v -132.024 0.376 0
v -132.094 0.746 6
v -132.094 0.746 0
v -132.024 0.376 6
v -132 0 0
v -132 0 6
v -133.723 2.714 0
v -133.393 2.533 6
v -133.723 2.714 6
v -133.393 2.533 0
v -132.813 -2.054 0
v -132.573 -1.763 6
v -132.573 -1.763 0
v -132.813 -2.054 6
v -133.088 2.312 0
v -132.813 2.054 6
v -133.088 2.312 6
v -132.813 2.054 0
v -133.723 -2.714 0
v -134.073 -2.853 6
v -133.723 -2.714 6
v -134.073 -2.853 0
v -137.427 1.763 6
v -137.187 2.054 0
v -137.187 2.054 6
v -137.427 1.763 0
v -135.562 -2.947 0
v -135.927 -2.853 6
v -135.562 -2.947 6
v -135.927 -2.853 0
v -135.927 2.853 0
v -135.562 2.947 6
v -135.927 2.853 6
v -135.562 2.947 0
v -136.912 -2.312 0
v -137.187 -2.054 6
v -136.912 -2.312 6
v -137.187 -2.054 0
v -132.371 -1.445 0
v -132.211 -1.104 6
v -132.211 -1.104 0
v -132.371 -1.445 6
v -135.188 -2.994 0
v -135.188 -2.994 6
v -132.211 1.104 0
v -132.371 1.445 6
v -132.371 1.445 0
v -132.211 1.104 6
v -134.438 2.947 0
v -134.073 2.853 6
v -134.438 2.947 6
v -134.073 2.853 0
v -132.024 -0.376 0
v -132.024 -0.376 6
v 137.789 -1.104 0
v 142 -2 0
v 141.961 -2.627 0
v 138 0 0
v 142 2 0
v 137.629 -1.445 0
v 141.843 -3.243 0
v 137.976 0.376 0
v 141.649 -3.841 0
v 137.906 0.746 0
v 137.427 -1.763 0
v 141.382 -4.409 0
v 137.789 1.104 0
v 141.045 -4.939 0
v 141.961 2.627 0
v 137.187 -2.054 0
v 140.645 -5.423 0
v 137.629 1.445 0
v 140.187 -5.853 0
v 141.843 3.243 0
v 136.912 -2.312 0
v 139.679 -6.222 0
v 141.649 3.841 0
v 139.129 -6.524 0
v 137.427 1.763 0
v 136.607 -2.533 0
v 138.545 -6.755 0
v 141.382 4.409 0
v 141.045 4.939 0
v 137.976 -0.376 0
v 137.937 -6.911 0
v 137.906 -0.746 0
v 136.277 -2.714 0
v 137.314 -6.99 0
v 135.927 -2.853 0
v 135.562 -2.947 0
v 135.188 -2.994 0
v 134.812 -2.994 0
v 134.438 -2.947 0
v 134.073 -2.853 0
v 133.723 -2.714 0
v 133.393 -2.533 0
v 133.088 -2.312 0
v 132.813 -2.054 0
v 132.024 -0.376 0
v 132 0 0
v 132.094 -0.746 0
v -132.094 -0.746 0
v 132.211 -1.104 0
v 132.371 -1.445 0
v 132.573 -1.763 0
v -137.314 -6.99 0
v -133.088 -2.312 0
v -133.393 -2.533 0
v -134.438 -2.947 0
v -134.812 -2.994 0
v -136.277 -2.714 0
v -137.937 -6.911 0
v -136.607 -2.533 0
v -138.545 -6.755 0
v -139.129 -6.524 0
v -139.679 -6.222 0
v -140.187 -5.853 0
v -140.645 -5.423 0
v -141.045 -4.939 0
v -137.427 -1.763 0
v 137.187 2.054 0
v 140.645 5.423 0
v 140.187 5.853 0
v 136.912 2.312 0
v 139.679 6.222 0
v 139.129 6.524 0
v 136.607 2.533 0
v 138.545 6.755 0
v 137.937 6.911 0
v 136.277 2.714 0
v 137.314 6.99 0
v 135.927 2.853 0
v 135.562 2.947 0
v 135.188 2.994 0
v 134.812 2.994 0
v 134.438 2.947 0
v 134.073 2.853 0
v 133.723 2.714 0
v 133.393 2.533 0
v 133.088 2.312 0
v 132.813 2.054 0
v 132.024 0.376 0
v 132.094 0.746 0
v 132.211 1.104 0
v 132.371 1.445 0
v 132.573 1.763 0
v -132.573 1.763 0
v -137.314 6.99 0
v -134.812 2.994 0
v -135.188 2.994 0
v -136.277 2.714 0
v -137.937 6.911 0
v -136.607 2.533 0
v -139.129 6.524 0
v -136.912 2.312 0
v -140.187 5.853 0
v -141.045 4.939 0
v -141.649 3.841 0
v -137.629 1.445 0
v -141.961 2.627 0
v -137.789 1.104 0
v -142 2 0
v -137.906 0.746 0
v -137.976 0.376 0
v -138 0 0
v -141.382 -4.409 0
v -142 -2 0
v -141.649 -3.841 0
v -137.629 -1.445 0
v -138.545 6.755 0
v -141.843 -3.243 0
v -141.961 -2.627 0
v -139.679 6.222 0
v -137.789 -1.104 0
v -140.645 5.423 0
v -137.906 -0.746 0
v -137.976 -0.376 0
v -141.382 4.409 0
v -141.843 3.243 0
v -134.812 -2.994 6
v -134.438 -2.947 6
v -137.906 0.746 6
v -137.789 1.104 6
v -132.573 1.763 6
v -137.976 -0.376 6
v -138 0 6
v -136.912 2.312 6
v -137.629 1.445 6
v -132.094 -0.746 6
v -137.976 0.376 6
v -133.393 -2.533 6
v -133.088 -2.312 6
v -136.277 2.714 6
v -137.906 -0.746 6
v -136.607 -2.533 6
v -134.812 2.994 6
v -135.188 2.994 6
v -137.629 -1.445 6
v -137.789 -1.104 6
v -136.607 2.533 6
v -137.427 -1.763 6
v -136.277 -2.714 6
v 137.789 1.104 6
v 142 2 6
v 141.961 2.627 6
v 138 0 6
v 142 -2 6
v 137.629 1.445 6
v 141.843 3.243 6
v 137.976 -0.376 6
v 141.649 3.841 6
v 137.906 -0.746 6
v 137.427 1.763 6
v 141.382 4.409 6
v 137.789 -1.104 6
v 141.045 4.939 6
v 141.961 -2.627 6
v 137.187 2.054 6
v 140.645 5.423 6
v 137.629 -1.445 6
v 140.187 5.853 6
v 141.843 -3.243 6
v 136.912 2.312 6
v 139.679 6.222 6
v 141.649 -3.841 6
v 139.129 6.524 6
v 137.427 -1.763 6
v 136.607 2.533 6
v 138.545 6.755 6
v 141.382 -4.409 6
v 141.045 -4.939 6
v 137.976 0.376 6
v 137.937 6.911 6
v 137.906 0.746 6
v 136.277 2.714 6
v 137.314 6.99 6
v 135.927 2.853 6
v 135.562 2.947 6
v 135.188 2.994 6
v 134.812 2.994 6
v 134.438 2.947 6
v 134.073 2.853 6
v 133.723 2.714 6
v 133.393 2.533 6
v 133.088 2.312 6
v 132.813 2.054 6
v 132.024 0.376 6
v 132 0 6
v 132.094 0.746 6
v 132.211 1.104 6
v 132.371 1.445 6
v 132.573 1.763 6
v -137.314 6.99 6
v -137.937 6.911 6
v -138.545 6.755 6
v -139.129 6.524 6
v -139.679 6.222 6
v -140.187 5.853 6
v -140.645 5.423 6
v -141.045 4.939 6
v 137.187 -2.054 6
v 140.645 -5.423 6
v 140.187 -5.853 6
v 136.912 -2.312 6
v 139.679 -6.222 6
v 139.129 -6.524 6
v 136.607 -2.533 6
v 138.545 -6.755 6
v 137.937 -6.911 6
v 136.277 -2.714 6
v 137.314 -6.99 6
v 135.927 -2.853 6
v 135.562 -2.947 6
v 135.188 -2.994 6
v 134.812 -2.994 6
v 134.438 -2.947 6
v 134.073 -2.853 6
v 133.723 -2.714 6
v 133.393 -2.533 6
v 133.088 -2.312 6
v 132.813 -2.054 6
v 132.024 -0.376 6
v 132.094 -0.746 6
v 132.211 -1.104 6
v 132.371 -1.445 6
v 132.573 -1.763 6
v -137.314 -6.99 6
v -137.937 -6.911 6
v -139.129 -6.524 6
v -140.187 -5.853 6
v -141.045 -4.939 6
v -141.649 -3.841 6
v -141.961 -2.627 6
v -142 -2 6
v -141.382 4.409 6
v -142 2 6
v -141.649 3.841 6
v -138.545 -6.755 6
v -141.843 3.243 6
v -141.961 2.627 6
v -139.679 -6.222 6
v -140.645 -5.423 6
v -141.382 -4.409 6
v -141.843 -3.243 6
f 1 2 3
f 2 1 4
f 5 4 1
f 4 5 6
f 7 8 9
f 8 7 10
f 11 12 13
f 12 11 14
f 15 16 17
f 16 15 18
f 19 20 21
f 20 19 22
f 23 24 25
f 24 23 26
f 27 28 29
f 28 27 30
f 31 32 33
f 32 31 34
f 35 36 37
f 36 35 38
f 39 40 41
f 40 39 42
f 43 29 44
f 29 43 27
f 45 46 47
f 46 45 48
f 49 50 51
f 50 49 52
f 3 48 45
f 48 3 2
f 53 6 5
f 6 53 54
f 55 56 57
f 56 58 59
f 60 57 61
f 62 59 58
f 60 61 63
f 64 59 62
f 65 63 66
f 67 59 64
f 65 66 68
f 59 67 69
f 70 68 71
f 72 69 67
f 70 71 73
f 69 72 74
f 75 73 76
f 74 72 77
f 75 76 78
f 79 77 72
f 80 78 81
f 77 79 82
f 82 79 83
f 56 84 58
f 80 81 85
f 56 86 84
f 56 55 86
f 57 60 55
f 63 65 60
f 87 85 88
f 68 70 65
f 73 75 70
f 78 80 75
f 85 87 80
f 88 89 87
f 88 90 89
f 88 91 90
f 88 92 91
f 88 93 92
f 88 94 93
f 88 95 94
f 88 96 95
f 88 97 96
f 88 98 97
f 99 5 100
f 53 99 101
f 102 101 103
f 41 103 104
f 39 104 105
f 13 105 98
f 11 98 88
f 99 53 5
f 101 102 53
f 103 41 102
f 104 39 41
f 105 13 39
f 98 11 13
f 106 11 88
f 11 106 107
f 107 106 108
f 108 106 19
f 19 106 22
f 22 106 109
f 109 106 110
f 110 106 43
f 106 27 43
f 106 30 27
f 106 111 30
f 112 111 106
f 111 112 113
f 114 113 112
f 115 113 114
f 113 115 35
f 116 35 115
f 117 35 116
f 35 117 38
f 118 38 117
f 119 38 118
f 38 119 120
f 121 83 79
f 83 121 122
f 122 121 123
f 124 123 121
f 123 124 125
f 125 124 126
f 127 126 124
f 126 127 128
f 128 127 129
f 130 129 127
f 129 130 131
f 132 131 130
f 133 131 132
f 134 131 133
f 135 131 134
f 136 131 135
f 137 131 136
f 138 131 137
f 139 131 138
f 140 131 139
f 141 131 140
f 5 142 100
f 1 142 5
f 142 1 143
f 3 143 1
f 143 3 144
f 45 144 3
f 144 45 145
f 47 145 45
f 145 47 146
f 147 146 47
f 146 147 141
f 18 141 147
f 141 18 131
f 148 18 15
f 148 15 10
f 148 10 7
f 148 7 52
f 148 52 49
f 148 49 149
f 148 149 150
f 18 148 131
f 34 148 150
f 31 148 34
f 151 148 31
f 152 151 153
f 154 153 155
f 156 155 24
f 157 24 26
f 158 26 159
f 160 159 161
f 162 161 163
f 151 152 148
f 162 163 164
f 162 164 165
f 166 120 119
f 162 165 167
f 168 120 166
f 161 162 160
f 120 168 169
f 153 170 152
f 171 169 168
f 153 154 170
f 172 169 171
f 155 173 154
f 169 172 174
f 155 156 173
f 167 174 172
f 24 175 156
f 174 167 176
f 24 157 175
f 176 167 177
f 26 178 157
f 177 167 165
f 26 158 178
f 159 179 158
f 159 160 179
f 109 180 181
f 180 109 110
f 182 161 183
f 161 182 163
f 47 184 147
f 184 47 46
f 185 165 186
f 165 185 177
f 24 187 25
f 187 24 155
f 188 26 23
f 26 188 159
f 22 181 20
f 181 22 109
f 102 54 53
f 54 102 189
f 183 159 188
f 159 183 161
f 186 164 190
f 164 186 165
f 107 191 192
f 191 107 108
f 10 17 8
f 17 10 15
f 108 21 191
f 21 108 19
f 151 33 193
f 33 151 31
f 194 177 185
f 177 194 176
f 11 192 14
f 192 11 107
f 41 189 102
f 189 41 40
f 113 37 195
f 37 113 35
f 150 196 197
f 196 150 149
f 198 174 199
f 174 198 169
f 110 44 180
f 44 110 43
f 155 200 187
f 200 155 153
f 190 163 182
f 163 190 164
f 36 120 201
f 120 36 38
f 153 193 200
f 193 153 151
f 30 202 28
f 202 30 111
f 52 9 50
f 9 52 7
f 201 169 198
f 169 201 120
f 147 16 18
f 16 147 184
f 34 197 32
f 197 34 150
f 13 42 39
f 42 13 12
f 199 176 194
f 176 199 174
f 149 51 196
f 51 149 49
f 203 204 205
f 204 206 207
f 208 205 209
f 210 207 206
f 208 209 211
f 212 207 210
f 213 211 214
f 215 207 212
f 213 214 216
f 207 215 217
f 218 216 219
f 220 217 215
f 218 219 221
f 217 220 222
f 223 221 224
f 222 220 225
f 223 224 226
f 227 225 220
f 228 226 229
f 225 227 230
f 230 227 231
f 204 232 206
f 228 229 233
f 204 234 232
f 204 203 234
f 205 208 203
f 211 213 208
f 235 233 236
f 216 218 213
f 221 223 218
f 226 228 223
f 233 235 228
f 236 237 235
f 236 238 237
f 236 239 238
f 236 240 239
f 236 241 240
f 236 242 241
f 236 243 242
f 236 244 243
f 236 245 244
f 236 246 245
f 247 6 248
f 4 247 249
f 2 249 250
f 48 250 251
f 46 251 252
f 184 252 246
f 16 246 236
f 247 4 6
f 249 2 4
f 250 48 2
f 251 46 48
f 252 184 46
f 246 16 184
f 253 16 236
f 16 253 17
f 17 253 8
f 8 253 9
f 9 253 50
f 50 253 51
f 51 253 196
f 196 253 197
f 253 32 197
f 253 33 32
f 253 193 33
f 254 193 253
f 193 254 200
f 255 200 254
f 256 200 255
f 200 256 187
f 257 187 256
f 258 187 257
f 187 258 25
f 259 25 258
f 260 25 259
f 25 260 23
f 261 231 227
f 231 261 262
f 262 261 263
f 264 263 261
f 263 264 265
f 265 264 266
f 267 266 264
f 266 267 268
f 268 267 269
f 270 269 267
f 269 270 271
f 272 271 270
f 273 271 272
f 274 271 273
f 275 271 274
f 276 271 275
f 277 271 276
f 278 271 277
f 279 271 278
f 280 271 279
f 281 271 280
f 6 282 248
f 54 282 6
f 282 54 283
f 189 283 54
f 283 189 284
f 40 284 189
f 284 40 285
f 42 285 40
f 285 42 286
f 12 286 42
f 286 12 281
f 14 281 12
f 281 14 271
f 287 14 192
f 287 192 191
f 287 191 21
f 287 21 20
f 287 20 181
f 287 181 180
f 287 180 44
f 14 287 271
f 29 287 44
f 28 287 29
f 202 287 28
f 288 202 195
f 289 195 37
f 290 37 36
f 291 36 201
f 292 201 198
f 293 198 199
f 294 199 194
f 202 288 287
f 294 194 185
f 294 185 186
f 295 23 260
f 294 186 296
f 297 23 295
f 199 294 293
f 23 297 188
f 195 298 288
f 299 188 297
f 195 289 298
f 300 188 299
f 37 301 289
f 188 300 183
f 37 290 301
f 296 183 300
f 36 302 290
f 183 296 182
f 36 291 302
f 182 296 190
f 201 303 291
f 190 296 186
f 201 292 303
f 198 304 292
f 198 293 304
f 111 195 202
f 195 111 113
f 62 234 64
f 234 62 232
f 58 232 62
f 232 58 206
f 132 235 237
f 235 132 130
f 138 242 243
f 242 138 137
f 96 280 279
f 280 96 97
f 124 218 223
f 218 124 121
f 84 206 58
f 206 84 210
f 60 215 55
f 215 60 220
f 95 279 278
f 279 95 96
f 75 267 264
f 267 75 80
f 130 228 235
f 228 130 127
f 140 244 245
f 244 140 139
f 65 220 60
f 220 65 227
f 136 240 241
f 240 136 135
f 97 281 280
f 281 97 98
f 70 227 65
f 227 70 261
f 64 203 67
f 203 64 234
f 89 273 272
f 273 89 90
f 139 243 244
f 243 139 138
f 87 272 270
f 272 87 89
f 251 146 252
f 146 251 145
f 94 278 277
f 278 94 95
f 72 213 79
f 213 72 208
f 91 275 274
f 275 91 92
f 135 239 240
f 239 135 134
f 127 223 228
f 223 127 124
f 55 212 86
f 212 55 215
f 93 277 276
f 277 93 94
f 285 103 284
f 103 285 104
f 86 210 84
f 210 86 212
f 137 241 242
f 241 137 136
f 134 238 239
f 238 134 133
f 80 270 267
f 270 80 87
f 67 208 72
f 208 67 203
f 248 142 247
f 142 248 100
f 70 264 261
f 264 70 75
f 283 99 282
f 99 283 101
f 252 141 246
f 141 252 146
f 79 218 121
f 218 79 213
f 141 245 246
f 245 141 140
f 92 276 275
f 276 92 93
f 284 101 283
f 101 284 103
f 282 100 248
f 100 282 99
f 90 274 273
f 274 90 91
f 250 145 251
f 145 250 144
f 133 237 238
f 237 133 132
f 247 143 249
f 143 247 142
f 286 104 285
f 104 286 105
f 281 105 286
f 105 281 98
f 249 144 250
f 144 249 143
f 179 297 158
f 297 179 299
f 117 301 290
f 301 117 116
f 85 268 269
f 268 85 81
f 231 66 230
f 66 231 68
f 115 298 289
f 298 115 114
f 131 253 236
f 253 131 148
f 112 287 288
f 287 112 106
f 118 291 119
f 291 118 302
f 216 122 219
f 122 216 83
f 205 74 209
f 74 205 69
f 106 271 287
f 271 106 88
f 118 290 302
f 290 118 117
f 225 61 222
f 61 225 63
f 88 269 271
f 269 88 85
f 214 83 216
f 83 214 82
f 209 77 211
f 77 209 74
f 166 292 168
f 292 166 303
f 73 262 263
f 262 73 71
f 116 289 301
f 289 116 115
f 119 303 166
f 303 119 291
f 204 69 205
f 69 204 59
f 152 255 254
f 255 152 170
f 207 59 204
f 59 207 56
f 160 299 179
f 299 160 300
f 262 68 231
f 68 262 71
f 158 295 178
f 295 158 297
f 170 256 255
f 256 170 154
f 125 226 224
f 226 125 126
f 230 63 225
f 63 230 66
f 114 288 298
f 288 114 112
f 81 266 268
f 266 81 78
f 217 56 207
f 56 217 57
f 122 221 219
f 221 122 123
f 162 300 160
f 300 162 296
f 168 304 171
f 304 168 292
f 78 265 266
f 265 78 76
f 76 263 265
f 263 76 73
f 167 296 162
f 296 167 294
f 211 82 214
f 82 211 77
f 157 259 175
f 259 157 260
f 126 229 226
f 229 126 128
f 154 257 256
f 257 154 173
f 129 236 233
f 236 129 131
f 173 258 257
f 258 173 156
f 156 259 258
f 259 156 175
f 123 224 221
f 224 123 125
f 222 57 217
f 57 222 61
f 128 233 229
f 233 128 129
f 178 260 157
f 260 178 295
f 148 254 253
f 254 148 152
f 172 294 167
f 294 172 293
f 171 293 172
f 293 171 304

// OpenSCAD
$fn = 50;


difference() {
	union() {
		hull() {
			translate(v = [-137.0000000000, 2.0000000000, 0]) {
				cylinder(h = 6, r = 5);
			}
			translate(v = [137.0000000000, 2.0000000000, 0]) {
				cylinder(h = 6, r = 5);
			}
			translate(v = [-137.0000000000, -2.0000000000, 0]) {
				cylinder(h = 6, r = 5);
			}
			translate(v = [137.0000000000, -2.0000000000, 0]) {
				cylinder(h = 6, r = 5);
			}
		}
	}
	union() {
		translate(v = [-135.0000000000, 0.0000000000, 0]) {
			cylinder(h = 6, r = 3.0000000000);
		}
		translate(v = [135.0000000000, 0.0000000000, 0]) {
			cylinder(h = 6, r = 3.0000000000);
		}
		translate(v = [-135.0000000000, 0.0000000000, 0]) {
			cylinder(h = 6, r = 1.5000000000);
		}
		translate(v = [135.0000000000, 0.0000000000, 0]) {
			cylinder(h = 6, r = 1.5000000000);
		}
		translate(v = [-135.0000000000, 0.0000000000, 0]) {
			cylinder(h = 6, r = 1.5000000000);
		}
		translate(v = [135.0000000000, 0.0000000000, 0]) {
			cylinder(h = 6, r = 1.5000000000);
		}
		translate(v = [-135.0000000000, 0.0000000000, 0]) {
			cylinder(h = 6, r = 1.5000000000);
		}
		translate(v = [135.0000000000, 0.0000000000, 0]) {
			cylinder(h = 6, r = 1.5000000000);
		}
	}
}
